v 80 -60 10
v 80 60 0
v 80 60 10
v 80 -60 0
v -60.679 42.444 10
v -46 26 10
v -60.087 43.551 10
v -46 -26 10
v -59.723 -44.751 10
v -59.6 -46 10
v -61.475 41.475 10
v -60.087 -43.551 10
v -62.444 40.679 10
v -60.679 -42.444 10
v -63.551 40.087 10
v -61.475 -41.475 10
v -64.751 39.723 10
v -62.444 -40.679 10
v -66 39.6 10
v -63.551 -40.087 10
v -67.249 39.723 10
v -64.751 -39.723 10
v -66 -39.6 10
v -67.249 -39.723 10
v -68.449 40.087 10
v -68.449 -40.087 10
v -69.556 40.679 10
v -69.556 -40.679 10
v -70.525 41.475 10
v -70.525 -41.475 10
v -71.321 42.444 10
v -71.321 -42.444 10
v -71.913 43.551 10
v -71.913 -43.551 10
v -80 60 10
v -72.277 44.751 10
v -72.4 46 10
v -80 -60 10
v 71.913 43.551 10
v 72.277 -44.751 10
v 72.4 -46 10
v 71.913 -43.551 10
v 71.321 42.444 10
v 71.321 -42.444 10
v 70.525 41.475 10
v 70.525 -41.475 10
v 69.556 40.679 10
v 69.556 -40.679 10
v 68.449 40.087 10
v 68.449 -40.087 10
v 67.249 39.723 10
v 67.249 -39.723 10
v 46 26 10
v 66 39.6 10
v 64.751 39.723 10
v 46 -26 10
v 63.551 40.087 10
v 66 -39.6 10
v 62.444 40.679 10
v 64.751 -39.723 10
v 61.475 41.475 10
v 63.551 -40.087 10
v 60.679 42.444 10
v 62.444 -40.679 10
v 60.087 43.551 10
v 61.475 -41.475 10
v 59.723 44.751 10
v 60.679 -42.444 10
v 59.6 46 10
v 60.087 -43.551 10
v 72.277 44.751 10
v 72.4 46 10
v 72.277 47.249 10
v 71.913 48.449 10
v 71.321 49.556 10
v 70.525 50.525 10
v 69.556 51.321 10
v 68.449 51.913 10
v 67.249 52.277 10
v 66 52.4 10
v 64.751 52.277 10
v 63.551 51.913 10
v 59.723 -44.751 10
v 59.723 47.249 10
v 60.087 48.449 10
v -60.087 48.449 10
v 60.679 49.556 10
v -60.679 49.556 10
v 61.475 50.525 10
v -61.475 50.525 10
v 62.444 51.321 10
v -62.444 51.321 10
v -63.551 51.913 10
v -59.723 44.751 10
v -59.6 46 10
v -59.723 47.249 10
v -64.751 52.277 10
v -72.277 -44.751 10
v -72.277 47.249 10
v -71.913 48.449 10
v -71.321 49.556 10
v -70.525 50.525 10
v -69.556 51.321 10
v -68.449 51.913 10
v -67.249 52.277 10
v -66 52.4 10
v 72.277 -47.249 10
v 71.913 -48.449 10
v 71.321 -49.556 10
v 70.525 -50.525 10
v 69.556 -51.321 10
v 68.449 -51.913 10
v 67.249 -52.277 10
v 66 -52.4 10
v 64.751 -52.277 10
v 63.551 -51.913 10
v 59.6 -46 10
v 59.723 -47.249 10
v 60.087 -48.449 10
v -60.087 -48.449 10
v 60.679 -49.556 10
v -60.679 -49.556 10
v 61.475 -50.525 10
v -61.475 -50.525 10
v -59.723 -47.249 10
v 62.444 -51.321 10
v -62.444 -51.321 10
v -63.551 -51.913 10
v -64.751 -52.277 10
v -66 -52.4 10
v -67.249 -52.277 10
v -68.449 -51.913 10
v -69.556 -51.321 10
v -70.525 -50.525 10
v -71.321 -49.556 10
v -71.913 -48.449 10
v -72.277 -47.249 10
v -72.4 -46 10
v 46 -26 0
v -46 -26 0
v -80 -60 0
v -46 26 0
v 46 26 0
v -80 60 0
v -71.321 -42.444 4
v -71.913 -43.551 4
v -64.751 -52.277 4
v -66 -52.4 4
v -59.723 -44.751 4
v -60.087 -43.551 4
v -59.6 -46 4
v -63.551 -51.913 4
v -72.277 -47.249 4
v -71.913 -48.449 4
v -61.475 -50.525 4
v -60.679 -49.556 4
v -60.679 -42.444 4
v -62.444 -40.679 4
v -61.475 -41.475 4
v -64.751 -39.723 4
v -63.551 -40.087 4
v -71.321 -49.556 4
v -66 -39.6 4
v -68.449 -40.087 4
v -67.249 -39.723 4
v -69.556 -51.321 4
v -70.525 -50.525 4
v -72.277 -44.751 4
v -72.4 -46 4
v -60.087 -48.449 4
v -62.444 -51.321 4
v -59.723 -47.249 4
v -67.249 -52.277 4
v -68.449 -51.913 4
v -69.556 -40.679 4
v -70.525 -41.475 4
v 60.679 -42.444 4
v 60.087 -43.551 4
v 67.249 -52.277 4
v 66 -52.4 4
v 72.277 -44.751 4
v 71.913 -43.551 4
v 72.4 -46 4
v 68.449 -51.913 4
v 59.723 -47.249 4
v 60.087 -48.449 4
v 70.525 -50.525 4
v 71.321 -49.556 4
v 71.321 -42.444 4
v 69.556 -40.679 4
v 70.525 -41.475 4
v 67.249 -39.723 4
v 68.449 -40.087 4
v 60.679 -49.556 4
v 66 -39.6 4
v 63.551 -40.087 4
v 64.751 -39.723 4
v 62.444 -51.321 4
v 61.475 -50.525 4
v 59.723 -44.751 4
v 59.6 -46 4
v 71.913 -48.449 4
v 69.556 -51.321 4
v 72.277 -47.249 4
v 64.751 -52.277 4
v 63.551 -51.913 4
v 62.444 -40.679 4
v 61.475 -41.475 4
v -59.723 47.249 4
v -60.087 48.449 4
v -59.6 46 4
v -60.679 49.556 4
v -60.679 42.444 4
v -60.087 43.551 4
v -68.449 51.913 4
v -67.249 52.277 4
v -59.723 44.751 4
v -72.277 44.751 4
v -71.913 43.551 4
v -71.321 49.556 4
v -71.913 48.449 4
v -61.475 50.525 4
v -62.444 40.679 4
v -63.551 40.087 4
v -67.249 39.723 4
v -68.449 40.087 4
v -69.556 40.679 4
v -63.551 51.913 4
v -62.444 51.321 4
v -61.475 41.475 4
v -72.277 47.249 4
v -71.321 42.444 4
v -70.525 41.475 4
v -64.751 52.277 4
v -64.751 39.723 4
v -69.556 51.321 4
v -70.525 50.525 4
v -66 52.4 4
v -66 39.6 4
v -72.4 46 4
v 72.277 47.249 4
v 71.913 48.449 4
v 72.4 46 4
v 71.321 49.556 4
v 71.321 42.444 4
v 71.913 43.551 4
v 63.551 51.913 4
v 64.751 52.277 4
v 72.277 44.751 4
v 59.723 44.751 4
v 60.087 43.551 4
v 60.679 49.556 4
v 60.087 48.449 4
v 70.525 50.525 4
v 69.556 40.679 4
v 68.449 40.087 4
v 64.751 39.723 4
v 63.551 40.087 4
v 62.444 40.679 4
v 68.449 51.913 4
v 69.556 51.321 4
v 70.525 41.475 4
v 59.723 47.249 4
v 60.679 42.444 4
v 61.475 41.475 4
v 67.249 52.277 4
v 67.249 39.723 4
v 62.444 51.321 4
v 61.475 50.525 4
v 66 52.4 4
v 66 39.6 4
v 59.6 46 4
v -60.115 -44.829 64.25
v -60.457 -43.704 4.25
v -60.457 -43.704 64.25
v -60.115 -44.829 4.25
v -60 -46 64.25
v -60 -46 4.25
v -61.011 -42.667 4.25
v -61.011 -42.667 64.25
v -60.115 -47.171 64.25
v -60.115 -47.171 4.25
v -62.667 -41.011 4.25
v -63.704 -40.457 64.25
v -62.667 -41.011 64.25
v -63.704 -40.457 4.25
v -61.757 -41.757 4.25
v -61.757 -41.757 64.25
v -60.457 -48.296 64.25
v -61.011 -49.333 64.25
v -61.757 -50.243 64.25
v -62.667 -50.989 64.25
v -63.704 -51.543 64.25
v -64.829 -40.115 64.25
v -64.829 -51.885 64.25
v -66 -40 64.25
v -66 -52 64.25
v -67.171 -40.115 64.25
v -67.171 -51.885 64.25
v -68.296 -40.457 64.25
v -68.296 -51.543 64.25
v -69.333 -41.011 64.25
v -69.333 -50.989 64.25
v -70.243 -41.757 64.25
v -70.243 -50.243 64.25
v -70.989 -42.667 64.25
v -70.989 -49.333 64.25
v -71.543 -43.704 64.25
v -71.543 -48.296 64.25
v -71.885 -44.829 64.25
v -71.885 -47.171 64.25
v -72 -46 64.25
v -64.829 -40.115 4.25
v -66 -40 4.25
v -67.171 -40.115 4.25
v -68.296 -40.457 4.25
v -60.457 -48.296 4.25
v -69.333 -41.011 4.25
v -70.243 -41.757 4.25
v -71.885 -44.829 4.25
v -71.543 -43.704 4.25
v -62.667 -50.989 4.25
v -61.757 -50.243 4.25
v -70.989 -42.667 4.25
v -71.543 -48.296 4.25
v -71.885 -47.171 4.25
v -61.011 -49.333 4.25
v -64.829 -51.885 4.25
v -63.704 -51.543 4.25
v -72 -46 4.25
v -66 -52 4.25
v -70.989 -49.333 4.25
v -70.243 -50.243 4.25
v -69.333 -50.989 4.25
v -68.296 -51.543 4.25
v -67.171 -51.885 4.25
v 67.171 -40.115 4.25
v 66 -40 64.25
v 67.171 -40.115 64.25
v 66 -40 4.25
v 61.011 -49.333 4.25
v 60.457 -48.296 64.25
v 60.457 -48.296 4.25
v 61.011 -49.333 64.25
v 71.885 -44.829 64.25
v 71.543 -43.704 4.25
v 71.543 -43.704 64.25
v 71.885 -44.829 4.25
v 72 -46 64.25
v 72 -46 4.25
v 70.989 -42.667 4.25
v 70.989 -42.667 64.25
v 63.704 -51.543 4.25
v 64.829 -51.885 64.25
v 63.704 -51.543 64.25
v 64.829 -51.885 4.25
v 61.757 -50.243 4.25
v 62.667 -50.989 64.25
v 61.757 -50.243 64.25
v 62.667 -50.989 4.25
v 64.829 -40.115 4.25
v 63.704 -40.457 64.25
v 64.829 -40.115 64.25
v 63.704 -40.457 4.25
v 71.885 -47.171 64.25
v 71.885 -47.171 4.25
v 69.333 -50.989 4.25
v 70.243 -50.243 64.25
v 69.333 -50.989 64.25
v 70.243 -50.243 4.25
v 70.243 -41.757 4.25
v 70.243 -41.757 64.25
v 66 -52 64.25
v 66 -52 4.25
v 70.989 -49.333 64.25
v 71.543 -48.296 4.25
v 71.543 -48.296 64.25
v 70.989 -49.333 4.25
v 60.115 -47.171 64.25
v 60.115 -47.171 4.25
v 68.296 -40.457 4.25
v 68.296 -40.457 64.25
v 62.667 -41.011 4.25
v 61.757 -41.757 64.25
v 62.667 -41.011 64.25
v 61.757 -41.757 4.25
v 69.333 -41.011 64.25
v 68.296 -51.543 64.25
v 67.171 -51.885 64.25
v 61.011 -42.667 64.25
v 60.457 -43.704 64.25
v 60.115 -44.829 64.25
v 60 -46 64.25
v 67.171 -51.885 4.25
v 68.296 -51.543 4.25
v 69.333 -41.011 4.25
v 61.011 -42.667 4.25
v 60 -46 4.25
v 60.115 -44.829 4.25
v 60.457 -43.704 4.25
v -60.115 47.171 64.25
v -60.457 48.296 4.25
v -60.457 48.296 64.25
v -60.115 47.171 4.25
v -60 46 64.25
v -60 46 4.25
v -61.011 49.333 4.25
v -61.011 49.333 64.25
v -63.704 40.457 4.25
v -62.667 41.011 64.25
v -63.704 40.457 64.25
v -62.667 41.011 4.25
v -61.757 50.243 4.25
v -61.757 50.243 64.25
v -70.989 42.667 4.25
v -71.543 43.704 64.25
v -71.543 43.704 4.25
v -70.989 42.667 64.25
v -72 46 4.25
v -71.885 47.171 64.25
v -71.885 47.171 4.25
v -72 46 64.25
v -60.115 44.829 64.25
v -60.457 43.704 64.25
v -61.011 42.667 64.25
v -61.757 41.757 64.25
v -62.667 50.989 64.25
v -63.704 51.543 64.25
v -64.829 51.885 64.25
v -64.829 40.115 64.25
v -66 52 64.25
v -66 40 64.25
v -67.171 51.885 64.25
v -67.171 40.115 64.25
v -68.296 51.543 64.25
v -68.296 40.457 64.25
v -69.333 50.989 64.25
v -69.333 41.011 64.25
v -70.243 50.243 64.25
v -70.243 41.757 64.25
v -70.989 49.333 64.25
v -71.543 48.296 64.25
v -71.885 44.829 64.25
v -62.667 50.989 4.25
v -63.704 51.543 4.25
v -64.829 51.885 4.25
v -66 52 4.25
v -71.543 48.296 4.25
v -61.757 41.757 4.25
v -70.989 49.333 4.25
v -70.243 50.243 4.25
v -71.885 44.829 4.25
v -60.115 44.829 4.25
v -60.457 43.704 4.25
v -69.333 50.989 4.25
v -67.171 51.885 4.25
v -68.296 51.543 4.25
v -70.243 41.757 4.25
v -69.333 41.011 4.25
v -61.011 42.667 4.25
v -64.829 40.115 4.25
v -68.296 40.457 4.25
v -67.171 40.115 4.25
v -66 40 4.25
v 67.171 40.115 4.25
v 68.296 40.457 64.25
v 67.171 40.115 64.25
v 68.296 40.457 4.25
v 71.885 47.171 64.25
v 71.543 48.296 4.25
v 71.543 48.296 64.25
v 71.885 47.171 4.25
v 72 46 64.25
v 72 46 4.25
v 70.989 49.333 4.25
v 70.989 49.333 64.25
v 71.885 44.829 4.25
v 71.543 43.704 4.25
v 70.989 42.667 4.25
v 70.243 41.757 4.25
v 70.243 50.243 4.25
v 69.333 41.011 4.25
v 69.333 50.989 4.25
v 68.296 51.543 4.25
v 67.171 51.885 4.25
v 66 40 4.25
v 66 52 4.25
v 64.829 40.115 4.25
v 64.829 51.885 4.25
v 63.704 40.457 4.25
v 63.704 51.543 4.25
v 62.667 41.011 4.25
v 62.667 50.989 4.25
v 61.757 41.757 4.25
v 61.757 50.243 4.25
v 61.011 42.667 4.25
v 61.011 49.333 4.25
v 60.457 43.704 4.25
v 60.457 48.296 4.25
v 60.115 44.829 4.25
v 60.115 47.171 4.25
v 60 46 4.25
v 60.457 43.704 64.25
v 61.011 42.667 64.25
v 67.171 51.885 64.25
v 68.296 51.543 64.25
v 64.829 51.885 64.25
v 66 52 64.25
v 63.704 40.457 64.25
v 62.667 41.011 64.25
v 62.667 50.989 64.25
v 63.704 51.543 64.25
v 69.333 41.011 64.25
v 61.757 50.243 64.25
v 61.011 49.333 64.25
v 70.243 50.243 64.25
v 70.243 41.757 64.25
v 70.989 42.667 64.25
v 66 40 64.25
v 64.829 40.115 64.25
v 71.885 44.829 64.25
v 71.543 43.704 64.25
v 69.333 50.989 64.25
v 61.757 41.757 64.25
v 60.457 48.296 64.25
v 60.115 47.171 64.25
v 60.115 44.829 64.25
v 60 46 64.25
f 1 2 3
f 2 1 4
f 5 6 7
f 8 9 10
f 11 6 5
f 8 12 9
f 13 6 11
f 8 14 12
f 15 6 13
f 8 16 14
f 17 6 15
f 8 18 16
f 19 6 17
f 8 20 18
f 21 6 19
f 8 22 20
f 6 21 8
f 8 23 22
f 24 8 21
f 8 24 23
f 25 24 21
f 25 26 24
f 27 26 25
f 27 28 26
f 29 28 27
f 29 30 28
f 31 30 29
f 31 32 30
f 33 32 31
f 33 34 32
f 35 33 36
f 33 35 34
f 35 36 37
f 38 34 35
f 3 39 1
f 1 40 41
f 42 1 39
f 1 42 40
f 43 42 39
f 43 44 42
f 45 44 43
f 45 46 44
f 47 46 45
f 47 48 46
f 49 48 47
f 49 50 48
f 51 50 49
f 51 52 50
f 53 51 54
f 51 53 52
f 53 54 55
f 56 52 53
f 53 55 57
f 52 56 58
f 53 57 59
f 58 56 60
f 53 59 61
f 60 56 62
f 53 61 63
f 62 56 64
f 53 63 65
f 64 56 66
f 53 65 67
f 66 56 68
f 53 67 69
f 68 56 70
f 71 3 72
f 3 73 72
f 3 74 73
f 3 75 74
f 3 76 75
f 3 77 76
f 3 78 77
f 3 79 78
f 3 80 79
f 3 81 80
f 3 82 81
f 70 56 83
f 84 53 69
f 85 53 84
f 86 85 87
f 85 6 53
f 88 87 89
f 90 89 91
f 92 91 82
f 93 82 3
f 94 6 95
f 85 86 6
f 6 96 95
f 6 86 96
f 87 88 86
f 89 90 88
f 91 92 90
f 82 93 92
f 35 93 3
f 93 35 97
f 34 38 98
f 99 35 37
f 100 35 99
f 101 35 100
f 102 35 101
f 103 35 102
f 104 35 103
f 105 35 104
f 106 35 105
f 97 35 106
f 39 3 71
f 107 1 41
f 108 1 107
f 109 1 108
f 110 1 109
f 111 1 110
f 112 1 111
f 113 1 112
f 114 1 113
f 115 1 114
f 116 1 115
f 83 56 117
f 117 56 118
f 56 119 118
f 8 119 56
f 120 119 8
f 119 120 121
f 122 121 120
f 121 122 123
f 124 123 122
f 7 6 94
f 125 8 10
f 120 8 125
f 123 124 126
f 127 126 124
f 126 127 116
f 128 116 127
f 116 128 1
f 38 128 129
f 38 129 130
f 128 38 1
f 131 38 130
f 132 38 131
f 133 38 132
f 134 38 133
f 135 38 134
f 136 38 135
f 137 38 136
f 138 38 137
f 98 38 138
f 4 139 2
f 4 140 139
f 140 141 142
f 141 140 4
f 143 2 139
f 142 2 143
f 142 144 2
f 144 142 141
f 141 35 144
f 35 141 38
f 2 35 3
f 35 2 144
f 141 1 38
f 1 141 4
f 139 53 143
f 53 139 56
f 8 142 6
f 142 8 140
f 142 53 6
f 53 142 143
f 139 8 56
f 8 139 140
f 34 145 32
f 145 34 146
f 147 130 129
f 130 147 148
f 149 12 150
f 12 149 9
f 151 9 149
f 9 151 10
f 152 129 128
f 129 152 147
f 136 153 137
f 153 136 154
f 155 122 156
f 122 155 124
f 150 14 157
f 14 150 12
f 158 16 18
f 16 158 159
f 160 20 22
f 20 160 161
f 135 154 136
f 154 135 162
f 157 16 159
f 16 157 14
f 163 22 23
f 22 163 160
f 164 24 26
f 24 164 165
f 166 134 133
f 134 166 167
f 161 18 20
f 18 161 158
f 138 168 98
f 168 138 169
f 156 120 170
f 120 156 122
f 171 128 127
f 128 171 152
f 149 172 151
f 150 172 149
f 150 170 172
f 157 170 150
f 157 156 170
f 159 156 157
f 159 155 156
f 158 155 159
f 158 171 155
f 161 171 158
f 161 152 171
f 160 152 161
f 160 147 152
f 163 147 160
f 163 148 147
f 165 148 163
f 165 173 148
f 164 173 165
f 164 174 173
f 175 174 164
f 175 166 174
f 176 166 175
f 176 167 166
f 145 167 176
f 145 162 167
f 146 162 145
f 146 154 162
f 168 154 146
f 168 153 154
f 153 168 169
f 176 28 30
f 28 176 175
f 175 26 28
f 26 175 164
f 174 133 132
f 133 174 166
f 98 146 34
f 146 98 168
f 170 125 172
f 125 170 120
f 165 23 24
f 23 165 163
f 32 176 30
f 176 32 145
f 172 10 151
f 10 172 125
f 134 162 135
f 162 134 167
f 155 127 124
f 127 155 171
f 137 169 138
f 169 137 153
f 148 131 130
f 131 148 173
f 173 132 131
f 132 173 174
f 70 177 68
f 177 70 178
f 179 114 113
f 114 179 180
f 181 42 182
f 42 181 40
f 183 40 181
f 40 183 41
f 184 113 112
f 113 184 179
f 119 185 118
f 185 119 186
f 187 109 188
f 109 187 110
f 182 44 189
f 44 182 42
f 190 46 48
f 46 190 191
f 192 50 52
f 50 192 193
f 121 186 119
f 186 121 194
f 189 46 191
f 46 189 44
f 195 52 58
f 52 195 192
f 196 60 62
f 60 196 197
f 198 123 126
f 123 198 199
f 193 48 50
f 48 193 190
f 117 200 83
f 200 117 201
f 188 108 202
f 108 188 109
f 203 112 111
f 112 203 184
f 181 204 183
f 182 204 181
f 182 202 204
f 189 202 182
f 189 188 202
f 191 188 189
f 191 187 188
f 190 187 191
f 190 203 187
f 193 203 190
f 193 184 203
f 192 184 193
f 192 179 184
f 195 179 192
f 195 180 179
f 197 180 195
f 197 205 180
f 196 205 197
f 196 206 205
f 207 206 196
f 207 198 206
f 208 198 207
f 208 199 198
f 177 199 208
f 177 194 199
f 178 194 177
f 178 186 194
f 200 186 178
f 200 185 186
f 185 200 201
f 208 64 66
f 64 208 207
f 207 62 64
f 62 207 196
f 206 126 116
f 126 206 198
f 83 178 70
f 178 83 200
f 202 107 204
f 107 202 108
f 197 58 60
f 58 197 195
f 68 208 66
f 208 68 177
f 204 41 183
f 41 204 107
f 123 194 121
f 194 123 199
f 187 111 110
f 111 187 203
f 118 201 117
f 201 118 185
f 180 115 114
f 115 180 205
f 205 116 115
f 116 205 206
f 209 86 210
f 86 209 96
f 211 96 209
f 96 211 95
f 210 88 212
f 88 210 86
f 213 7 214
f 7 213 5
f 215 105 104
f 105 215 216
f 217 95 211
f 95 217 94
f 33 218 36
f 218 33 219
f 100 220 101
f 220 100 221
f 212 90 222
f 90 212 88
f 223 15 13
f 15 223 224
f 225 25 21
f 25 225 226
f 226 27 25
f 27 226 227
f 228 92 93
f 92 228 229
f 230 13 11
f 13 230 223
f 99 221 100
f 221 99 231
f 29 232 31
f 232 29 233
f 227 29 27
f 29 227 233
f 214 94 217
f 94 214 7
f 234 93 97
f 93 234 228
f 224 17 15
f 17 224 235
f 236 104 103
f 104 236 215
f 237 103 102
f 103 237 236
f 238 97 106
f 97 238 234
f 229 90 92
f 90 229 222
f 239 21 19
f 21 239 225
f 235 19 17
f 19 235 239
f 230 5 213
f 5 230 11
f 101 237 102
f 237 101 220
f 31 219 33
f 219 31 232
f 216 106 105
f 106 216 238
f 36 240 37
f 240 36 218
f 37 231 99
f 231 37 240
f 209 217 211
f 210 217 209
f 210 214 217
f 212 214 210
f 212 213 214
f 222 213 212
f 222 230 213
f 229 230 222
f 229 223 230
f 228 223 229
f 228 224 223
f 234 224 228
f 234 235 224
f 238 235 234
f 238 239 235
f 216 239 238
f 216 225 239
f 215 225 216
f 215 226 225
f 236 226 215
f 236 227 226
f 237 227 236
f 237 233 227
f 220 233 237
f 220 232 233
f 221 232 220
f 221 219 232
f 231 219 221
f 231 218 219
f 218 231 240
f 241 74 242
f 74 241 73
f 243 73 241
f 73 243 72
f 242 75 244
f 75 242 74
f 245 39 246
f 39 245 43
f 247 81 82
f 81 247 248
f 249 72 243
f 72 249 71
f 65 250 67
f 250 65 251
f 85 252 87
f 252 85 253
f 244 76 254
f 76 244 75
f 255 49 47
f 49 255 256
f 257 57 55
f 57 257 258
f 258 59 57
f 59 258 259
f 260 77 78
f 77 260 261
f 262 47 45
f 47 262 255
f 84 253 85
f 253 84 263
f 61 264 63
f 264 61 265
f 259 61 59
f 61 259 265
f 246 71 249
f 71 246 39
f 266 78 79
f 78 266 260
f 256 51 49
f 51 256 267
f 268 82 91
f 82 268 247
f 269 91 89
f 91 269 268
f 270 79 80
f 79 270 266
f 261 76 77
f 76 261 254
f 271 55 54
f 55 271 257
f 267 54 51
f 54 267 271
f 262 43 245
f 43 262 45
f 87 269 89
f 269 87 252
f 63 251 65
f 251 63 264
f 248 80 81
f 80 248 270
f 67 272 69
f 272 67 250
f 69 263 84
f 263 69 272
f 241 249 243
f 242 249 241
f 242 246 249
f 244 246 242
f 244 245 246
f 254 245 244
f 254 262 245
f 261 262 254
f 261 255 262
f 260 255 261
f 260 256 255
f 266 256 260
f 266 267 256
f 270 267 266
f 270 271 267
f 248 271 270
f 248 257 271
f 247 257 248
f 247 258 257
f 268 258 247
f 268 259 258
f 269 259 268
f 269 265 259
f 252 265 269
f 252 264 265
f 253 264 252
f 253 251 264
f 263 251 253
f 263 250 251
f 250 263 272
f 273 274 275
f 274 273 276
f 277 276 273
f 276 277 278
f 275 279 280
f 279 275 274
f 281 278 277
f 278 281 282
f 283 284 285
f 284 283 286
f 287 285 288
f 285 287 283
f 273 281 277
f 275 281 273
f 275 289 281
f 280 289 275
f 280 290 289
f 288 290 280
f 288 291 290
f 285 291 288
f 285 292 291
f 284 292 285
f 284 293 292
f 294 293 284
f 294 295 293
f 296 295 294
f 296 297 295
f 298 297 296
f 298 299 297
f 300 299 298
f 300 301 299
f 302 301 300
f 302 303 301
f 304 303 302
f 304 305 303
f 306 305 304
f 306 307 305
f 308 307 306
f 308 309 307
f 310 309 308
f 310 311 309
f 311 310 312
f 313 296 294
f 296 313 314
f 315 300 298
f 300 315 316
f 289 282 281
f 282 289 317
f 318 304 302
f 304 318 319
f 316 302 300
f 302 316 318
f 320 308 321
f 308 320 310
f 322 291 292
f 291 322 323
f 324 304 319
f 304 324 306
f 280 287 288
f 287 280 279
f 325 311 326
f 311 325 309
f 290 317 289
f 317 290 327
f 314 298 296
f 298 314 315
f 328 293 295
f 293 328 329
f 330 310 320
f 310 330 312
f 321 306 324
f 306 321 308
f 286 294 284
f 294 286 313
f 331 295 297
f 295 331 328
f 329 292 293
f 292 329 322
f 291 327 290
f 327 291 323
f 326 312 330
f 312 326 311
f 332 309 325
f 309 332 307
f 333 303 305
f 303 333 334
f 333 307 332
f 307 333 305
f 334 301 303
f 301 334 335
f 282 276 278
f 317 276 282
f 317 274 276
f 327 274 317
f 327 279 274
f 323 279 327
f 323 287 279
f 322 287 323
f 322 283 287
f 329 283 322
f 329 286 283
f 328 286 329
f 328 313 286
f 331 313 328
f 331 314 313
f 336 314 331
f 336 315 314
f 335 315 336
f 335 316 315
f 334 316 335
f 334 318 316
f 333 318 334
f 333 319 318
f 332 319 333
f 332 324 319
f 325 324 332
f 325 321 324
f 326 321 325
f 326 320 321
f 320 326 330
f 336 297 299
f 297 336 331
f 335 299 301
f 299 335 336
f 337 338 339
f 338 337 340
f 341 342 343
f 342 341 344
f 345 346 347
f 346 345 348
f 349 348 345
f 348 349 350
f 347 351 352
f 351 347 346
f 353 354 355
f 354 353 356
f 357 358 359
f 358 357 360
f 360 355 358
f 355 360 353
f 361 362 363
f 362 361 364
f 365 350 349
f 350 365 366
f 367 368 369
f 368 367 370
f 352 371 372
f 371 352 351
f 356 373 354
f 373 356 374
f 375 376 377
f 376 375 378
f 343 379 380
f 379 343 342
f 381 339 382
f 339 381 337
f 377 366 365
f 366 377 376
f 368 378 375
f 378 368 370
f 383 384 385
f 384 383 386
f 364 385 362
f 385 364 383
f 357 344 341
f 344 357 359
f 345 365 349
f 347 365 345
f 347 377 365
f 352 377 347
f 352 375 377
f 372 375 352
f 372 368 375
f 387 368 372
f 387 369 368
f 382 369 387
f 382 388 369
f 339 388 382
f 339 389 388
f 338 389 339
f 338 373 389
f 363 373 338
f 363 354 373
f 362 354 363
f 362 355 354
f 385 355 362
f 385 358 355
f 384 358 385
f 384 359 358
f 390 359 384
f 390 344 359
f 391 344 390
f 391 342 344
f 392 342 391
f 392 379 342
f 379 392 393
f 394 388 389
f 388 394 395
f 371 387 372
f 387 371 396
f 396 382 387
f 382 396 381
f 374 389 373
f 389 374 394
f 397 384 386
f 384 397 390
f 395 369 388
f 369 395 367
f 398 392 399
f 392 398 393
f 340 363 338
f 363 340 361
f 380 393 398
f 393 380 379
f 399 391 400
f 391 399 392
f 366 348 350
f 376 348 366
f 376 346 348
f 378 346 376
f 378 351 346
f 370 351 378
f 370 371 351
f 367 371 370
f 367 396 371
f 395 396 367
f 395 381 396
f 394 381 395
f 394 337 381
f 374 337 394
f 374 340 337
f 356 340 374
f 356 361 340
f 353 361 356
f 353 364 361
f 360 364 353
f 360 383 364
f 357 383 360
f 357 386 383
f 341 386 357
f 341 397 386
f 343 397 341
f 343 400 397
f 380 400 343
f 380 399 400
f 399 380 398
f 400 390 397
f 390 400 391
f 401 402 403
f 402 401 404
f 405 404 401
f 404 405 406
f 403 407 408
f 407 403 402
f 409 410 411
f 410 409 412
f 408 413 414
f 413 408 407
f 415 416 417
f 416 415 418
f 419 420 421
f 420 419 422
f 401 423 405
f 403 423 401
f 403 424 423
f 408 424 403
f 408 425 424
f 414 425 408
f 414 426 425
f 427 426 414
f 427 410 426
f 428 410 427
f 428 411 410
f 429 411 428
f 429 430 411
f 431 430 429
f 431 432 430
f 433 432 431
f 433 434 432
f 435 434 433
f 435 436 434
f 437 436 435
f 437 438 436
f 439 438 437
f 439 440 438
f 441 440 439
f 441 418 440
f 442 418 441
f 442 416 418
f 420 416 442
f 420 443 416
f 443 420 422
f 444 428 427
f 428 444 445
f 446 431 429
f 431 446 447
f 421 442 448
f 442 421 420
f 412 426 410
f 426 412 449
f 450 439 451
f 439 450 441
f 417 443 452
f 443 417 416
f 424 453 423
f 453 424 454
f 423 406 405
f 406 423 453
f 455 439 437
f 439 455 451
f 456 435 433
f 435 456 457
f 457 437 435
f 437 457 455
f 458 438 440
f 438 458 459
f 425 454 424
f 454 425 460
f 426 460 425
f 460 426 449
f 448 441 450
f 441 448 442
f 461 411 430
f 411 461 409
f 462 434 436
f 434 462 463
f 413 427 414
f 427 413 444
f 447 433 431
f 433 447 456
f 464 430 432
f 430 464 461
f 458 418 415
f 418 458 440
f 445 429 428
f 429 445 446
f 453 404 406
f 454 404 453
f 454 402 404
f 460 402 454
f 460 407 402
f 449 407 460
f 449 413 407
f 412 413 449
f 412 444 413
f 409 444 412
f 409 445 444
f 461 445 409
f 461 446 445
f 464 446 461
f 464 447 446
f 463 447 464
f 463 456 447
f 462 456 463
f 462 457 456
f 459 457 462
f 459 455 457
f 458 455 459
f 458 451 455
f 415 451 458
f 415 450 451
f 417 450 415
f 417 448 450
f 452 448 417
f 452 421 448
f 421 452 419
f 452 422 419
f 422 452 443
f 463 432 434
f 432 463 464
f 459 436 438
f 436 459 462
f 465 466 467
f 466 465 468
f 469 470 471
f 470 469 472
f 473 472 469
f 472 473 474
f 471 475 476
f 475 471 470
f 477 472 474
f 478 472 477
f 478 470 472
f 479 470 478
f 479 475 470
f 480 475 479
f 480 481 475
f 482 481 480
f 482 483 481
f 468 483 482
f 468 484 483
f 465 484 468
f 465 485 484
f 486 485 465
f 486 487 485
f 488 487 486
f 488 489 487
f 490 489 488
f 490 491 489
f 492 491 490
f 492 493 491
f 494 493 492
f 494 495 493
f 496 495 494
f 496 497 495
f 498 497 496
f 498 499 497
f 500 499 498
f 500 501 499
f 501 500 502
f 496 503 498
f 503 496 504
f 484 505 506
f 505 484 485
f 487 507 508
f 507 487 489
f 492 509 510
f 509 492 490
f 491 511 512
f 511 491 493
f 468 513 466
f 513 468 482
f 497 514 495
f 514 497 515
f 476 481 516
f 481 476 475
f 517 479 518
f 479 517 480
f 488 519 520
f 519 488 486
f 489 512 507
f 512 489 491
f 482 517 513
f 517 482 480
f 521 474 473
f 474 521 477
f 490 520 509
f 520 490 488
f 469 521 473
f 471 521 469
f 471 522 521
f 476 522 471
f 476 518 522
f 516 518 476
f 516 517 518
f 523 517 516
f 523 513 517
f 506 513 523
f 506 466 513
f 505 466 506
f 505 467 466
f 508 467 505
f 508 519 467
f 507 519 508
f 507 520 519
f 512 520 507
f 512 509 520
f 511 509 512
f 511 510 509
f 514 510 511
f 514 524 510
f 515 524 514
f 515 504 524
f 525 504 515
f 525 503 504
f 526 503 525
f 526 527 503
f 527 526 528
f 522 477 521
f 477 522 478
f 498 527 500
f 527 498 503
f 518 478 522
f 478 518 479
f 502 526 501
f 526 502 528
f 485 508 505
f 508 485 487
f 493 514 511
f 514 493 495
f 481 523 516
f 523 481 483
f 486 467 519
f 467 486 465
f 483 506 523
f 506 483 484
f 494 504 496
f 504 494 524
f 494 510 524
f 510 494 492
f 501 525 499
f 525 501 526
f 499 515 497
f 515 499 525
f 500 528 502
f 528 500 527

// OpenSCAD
$fn = 32;

// ------------------------------------------------------------------------
// Frame with four posts: 160 x 120 mm frame, four d12 posts
// Every part is its own module, assembly() places them once.
// ------------------------------------------------------------------------

// --- part 1 ---
module base_frame() {
  difference() {
    translate([-80, -60, 0]) cube([160, 120, 10]);
    translate([-46, -26, -1]) cube([92, 52, 12]);
    translate([-66, -46, 4]) cylinder(h = 7, d = 12.8);
    translate([66, -46, 4]) cylinder(h = 7, d = 12.8);
    translate([-66, 46, 4]) cylinder(h = 7, d = 12.8);
    translate([66, 46, 4]) cylinder(h = 7, d = 12.8);
  }
}

// --- part 2 ---
module post1() {
  cylinder(h = 60, d = 12);
}

// --- part 3 ---
module post2() {
  cylinder(h = 60, d = 12);
}

// --- part 4 ---
module post3() {
  cylinder(h = 60, d = 12);
}

// --- part 5 ---
module post4() {
  cylinder(h = 60, d = 12);
}

// --- assembly ---
module assembly() {
  translate([0, 0, 0]) rotate([0, 0, 0]) base_frame();
  translate([-66, -46, 4.25]) rotate([0, 0, 0]) post1();
  translate([66, -46, 4.25]) rotate([0, 0, 0]) post2();
  translate([-66, 46, 4.25]) rotate([0, 0, 0]) post3();
  translate([66, 46, 4.25]) rotate([0, 0, 0]) post4();
}

assembly();
